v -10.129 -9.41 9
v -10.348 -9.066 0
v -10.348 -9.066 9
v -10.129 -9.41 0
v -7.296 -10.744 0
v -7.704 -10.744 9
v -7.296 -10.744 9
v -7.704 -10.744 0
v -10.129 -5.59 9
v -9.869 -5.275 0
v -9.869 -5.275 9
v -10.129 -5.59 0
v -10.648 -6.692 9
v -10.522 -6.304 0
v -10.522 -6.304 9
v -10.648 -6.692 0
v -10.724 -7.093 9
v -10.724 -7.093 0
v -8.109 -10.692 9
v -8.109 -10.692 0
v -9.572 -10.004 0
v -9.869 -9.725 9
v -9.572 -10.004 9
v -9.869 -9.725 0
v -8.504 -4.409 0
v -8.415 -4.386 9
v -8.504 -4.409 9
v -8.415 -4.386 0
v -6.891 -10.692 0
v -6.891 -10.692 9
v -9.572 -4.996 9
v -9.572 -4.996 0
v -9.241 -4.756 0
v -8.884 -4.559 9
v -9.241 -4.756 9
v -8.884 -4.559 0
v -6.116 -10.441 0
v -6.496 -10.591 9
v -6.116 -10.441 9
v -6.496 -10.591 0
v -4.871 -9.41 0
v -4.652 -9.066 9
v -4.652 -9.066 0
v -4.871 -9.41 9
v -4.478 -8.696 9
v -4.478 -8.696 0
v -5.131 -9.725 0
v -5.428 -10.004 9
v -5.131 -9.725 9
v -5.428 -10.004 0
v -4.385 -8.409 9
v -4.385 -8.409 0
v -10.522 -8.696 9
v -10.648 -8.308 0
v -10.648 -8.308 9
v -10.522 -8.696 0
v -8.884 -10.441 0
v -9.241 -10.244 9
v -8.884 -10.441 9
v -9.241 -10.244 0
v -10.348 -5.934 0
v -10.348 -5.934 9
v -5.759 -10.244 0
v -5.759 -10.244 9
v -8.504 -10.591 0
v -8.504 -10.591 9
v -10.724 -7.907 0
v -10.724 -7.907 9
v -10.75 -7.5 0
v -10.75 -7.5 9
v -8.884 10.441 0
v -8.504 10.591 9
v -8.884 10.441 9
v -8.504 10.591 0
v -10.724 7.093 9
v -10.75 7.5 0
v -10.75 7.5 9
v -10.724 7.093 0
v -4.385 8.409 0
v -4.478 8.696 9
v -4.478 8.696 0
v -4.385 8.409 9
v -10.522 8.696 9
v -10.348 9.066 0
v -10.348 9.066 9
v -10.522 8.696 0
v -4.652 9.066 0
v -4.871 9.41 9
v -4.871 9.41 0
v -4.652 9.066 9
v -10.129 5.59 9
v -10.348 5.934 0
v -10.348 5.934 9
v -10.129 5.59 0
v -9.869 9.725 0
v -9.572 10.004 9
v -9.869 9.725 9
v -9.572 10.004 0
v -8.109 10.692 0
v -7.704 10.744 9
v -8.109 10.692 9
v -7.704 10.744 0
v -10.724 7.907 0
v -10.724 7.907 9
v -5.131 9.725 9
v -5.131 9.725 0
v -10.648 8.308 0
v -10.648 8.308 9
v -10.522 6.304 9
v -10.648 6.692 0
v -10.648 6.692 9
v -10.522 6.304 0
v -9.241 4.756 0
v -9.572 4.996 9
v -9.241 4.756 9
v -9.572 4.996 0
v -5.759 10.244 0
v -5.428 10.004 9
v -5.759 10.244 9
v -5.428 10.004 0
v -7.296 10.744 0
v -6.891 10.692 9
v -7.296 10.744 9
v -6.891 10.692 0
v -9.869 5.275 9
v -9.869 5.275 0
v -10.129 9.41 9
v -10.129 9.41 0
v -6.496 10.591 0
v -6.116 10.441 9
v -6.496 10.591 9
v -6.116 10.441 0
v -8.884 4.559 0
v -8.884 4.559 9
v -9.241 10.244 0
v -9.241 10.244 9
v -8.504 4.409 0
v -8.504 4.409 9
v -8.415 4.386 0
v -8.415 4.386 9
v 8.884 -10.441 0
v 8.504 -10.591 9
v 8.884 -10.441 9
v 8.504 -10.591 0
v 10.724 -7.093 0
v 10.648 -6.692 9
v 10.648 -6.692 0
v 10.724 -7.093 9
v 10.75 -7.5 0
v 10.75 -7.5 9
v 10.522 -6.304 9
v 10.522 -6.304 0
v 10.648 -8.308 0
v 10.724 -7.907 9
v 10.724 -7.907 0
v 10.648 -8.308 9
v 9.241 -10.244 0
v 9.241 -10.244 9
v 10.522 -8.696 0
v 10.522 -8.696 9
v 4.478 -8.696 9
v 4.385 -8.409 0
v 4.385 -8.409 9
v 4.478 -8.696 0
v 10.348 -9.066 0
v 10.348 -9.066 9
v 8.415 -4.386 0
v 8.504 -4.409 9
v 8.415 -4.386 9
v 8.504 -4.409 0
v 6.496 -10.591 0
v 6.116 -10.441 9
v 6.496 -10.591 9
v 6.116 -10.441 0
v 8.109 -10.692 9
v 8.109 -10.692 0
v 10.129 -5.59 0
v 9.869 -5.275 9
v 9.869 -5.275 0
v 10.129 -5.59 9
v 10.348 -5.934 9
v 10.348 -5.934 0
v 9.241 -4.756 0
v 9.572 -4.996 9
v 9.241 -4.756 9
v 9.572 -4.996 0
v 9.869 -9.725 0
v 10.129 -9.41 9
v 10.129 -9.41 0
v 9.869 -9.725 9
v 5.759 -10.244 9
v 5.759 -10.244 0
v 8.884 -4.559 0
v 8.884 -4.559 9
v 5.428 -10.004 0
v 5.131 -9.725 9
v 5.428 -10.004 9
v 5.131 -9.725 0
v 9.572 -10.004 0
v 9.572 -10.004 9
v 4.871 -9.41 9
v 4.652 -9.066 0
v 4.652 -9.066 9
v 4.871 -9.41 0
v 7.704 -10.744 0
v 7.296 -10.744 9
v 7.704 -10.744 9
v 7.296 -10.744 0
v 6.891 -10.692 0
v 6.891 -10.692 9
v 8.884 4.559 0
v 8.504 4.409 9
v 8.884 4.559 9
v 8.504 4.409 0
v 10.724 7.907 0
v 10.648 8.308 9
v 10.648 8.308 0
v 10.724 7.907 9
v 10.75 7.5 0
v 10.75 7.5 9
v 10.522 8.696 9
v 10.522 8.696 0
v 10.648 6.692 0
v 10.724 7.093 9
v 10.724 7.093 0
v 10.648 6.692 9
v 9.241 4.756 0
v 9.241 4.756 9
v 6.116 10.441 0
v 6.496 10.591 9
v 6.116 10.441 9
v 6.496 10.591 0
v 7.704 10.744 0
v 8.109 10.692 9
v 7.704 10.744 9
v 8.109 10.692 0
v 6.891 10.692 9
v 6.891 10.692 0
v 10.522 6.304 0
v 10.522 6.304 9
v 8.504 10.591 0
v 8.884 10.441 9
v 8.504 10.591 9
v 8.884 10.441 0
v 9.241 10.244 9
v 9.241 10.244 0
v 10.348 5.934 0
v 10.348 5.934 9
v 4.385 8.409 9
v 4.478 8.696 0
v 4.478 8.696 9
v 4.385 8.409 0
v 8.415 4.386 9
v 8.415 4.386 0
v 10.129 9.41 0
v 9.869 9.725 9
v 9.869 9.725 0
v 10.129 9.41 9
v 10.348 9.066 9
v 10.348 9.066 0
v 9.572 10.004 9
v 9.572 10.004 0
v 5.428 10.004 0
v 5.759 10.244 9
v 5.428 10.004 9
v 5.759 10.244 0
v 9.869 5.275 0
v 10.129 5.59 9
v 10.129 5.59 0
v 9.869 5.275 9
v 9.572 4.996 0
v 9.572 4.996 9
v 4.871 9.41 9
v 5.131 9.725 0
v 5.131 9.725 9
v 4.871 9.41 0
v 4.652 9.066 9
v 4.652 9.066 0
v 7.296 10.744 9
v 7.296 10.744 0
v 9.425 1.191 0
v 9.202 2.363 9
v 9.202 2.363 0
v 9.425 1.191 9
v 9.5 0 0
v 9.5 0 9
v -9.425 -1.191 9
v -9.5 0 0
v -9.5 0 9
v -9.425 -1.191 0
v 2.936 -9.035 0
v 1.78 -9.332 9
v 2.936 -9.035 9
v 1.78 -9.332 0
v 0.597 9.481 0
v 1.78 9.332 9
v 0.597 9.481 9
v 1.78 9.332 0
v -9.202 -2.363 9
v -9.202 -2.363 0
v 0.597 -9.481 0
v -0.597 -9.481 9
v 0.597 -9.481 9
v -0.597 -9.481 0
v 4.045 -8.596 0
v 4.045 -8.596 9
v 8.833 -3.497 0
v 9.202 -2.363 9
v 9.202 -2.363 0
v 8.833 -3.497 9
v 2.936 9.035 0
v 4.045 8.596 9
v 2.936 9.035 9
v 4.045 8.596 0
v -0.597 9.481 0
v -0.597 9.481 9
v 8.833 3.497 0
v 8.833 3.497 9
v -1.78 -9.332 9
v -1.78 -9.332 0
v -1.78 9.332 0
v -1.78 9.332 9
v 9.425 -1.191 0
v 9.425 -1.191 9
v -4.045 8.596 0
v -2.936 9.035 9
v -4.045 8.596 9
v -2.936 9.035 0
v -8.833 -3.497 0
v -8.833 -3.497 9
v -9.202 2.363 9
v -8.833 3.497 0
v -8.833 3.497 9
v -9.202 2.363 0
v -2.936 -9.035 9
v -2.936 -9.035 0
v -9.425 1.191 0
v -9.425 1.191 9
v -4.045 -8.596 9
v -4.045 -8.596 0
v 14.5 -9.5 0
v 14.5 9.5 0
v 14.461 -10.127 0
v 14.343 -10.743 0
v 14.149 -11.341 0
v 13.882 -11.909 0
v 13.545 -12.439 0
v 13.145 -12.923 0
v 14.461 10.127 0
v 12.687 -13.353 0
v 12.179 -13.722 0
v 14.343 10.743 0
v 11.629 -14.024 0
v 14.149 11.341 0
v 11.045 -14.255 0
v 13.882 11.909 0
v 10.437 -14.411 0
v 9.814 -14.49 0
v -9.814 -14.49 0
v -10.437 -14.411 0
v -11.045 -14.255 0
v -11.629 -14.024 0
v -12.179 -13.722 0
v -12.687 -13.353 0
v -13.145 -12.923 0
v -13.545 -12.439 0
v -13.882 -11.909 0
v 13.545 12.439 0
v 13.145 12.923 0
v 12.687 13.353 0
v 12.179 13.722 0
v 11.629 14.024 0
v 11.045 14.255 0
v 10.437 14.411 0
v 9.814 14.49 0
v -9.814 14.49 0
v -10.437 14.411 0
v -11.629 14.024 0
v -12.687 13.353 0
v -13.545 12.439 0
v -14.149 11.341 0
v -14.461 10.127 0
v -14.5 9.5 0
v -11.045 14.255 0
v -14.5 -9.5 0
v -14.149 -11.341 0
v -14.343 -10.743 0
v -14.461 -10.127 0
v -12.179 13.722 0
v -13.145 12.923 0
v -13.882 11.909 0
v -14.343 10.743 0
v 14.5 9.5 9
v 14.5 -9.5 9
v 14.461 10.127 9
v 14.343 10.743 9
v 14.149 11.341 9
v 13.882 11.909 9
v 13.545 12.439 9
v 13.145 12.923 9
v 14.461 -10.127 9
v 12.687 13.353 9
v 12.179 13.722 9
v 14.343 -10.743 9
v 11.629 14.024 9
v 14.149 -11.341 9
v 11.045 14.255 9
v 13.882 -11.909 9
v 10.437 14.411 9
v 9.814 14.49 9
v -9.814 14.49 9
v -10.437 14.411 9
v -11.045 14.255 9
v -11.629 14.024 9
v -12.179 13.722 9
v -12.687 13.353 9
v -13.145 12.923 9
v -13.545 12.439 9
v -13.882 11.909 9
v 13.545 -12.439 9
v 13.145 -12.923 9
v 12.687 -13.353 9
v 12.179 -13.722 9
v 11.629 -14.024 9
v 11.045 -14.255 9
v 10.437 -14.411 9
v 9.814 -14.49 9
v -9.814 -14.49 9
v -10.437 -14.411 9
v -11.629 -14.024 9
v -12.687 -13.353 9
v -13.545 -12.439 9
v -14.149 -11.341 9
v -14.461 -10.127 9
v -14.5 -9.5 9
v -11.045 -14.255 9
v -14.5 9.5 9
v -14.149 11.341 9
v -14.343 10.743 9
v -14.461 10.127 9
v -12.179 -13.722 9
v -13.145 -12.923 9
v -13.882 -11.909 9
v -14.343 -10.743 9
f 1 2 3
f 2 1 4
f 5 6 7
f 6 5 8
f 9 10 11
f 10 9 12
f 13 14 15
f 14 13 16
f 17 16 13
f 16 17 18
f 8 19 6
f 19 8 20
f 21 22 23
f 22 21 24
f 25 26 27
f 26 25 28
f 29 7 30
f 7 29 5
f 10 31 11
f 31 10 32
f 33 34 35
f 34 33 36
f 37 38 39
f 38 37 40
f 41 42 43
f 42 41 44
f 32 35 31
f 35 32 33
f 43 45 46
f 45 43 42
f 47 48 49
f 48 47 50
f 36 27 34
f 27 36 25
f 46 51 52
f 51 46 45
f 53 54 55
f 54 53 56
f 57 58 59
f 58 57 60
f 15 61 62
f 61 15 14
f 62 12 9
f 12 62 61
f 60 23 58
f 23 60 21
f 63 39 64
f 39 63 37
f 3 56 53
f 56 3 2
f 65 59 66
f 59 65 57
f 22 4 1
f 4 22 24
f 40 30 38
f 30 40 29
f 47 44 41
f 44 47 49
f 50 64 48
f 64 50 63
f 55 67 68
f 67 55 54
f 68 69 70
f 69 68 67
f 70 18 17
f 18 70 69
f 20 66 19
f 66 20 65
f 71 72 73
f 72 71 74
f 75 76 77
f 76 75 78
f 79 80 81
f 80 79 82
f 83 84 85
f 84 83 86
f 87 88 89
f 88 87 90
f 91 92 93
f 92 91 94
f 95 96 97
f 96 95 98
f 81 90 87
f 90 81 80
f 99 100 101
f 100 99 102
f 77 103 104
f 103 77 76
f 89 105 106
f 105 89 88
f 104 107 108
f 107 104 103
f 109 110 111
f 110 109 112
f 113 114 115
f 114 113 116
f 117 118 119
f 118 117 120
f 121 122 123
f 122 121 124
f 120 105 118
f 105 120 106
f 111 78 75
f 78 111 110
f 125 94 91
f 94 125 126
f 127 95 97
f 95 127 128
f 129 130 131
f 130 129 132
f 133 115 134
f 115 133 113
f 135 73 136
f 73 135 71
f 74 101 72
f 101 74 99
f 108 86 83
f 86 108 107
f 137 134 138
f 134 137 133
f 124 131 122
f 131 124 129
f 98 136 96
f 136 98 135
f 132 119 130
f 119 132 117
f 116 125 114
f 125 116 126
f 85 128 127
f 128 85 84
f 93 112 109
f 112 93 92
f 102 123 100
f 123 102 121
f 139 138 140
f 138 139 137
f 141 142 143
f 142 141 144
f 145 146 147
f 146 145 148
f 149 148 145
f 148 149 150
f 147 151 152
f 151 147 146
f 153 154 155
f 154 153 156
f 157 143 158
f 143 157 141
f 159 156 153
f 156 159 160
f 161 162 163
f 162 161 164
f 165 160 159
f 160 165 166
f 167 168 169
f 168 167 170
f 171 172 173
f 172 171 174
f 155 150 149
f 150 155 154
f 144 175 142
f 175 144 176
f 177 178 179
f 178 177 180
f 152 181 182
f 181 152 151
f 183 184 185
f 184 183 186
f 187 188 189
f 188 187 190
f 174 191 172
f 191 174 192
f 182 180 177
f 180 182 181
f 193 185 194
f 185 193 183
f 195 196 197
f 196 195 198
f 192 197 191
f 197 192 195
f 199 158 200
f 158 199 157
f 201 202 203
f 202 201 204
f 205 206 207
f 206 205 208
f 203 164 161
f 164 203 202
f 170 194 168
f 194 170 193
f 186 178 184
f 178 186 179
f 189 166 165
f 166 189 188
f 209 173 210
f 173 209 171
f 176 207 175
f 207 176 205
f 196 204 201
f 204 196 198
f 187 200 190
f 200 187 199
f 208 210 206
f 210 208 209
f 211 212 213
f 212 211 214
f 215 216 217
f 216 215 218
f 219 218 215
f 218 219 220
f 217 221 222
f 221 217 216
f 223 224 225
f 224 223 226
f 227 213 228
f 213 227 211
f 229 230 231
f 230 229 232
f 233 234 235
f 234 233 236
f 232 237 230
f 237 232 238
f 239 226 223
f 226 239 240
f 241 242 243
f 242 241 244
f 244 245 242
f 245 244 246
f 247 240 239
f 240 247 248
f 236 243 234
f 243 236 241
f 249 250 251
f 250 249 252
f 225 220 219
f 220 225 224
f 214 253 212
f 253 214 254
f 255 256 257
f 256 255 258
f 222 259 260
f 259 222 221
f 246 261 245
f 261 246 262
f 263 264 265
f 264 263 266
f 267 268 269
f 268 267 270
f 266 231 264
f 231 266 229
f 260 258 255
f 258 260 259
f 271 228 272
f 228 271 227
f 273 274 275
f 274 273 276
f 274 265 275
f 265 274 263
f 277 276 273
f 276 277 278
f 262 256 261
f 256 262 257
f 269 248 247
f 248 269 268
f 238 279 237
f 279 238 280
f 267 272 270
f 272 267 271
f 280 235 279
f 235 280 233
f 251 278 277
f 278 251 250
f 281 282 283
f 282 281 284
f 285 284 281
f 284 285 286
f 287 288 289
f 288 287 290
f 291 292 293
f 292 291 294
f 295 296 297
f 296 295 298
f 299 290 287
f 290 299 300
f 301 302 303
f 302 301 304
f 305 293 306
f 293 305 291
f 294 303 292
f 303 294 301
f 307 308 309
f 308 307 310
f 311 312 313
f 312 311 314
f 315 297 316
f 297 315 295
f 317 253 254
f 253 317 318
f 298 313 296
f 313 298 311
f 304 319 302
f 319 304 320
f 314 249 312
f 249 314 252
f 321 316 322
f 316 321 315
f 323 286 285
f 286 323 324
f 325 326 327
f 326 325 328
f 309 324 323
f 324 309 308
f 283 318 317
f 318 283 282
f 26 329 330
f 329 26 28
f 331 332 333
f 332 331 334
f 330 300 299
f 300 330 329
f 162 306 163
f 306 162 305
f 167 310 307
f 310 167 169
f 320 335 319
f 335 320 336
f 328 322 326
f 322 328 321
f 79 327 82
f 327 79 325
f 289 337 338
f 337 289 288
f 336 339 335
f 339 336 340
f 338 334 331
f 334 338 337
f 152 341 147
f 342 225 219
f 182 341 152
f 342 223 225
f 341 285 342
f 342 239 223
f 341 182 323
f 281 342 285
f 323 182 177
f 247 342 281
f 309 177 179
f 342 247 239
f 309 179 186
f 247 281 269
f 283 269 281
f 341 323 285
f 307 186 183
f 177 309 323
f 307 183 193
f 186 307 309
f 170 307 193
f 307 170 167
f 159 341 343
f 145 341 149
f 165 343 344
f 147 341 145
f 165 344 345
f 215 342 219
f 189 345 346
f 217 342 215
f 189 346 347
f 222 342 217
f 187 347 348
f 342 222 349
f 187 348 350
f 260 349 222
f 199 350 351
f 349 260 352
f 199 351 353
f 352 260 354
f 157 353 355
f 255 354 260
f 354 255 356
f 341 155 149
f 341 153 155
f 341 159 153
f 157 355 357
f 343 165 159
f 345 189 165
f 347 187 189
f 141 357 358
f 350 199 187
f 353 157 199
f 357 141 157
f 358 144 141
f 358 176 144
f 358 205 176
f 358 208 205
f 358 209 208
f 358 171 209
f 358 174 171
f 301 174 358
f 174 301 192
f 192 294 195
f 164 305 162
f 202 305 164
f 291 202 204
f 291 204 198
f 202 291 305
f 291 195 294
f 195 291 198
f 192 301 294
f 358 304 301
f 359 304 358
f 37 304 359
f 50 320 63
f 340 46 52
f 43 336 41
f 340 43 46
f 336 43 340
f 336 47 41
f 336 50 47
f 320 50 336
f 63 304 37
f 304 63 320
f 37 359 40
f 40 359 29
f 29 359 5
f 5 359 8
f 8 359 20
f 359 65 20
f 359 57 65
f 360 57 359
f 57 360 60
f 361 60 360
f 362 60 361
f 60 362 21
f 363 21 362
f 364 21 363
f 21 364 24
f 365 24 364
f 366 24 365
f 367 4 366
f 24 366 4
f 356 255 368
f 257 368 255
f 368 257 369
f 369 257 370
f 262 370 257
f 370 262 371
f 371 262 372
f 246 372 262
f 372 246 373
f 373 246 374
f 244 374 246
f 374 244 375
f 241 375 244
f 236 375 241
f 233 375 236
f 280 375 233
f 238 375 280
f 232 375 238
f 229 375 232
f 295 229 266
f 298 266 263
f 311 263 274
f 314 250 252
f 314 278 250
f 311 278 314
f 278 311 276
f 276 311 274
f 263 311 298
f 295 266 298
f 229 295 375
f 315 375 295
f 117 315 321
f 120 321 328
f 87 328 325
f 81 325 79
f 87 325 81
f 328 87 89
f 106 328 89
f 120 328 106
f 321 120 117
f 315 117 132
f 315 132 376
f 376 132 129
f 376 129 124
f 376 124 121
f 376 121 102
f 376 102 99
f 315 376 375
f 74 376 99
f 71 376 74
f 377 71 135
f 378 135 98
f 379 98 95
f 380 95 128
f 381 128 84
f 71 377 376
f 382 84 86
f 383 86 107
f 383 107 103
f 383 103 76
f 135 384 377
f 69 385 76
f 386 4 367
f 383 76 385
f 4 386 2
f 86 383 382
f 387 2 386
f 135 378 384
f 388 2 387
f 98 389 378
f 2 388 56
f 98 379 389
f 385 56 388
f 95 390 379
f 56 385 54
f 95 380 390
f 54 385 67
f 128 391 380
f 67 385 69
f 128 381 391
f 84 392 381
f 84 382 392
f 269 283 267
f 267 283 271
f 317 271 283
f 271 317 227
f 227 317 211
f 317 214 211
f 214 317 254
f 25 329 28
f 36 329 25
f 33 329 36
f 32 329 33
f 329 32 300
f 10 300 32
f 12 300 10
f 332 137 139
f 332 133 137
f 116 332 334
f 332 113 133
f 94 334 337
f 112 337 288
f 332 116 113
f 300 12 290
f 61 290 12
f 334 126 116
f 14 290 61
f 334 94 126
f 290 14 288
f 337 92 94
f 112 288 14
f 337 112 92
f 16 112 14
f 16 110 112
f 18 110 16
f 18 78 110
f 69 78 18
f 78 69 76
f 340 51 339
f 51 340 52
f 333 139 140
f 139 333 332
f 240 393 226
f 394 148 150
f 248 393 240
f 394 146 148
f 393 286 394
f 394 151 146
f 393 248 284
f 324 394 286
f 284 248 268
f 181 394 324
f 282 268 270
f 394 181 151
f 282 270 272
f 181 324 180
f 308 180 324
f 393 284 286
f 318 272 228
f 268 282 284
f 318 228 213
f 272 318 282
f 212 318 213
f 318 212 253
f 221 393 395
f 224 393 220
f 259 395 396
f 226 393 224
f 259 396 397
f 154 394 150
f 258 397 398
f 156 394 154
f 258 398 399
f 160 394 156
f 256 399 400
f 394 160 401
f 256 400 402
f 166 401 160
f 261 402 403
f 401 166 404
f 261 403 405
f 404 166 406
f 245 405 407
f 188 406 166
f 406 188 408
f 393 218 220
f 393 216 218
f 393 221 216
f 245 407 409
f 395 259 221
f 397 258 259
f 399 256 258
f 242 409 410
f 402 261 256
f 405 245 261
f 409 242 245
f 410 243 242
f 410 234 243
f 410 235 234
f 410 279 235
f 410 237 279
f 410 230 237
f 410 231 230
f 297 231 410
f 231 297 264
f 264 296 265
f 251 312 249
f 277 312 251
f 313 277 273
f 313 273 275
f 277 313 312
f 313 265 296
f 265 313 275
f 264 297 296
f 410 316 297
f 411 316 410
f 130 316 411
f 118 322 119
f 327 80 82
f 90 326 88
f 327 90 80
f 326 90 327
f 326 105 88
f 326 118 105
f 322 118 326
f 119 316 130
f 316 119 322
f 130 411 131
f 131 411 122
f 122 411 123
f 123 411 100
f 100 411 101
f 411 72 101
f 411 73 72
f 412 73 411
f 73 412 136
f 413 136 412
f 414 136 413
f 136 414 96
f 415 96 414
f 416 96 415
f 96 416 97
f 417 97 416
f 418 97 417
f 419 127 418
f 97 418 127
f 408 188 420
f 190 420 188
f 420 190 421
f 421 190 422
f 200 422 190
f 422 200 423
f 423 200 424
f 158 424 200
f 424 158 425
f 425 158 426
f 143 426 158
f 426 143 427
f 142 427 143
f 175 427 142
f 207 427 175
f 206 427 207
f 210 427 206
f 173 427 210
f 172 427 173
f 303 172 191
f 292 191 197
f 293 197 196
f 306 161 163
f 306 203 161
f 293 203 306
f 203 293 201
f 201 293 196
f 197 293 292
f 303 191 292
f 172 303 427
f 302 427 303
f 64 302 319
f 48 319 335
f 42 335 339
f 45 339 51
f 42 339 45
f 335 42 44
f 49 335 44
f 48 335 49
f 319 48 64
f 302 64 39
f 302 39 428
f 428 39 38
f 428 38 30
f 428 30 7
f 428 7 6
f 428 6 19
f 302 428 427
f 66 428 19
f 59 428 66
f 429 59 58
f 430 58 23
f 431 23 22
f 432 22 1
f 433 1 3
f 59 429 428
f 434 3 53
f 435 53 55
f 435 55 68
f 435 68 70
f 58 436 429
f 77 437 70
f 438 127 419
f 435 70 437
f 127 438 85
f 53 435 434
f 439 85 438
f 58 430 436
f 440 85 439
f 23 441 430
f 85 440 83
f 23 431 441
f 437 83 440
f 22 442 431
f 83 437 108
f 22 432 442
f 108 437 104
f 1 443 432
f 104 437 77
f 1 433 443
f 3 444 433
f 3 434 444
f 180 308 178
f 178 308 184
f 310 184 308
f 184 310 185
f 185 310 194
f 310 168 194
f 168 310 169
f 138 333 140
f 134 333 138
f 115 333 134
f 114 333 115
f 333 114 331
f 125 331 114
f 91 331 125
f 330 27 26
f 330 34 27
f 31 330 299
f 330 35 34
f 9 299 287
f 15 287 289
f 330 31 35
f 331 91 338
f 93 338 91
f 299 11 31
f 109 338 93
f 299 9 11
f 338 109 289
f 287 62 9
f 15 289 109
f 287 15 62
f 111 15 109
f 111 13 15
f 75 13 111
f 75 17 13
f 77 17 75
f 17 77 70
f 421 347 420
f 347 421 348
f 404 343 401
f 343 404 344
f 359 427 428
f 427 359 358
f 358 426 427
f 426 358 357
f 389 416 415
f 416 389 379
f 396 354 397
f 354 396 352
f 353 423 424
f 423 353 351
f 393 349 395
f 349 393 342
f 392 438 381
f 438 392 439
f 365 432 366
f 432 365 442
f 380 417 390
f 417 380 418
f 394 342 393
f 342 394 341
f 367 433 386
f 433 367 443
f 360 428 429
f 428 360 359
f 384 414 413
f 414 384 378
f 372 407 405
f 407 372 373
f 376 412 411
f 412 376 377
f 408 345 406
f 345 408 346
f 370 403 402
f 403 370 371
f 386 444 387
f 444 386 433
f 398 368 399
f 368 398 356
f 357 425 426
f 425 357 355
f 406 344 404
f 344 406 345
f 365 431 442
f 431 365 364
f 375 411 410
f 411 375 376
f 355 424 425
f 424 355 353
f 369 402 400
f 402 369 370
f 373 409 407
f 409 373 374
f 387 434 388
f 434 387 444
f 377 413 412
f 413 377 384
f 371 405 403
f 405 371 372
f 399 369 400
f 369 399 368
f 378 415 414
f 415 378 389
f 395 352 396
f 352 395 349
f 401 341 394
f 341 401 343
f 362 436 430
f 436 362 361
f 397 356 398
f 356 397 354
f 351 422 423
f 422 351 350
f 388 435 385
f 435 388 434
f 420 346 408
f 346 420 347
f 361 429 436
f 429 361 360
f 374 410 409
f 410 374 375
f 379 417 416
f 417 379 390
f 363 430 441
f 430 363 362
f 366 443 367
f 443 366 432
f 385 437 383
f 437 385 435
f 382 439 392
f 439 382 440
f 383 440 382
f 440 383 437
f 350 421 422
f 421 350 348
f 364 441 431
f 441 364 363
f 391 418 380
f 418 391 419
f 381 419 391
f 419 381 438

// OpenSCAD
$fn = 50;


difference() {
	union() {
		hull() {
			translate(v = [-9.5000000000, 9.5000000000, 0]) {
				cylinder(h = 9, r = 5);
			}
			translate(v = [9.5000000000, 9.5000000000, 0]) {
				cylinder(h = 9, r = 5);
			}
			translate(v = [-9.5000000000, -9.5000000000, 0]) {
				cylinder(h = 9, r = 5);
			}
			translate(v = [9.5000000000, -9.5000000000, 0]) {
				cylinder(h = 9, r = 5);
			}
		}
	}
	union() {
		#translate(v = [-7.5000000000, -7.5000000000, -100.0000000000]) {
			cylinder(h = 200, r = 3.2500000000);
		}
		#translate(v = [-7.5000000000, 7.5000000000, -100.0000000000]) {
			cylinder(h = 200, r = 3.2500000000);
		}
		#translate(v = [7.5000000000, -7.5000000000, -100.0000000000]) {
			cylinder(h = 200, r = 3.2500000000);
		}
		#translate(v = [7.5000000000, 7.5000000000, -100.0000000000]) {
			cylinder(h = 200, r = 3.2500000000);
		}
		#cylinder(h = 9, r = 9.5000000000);
	}
}
